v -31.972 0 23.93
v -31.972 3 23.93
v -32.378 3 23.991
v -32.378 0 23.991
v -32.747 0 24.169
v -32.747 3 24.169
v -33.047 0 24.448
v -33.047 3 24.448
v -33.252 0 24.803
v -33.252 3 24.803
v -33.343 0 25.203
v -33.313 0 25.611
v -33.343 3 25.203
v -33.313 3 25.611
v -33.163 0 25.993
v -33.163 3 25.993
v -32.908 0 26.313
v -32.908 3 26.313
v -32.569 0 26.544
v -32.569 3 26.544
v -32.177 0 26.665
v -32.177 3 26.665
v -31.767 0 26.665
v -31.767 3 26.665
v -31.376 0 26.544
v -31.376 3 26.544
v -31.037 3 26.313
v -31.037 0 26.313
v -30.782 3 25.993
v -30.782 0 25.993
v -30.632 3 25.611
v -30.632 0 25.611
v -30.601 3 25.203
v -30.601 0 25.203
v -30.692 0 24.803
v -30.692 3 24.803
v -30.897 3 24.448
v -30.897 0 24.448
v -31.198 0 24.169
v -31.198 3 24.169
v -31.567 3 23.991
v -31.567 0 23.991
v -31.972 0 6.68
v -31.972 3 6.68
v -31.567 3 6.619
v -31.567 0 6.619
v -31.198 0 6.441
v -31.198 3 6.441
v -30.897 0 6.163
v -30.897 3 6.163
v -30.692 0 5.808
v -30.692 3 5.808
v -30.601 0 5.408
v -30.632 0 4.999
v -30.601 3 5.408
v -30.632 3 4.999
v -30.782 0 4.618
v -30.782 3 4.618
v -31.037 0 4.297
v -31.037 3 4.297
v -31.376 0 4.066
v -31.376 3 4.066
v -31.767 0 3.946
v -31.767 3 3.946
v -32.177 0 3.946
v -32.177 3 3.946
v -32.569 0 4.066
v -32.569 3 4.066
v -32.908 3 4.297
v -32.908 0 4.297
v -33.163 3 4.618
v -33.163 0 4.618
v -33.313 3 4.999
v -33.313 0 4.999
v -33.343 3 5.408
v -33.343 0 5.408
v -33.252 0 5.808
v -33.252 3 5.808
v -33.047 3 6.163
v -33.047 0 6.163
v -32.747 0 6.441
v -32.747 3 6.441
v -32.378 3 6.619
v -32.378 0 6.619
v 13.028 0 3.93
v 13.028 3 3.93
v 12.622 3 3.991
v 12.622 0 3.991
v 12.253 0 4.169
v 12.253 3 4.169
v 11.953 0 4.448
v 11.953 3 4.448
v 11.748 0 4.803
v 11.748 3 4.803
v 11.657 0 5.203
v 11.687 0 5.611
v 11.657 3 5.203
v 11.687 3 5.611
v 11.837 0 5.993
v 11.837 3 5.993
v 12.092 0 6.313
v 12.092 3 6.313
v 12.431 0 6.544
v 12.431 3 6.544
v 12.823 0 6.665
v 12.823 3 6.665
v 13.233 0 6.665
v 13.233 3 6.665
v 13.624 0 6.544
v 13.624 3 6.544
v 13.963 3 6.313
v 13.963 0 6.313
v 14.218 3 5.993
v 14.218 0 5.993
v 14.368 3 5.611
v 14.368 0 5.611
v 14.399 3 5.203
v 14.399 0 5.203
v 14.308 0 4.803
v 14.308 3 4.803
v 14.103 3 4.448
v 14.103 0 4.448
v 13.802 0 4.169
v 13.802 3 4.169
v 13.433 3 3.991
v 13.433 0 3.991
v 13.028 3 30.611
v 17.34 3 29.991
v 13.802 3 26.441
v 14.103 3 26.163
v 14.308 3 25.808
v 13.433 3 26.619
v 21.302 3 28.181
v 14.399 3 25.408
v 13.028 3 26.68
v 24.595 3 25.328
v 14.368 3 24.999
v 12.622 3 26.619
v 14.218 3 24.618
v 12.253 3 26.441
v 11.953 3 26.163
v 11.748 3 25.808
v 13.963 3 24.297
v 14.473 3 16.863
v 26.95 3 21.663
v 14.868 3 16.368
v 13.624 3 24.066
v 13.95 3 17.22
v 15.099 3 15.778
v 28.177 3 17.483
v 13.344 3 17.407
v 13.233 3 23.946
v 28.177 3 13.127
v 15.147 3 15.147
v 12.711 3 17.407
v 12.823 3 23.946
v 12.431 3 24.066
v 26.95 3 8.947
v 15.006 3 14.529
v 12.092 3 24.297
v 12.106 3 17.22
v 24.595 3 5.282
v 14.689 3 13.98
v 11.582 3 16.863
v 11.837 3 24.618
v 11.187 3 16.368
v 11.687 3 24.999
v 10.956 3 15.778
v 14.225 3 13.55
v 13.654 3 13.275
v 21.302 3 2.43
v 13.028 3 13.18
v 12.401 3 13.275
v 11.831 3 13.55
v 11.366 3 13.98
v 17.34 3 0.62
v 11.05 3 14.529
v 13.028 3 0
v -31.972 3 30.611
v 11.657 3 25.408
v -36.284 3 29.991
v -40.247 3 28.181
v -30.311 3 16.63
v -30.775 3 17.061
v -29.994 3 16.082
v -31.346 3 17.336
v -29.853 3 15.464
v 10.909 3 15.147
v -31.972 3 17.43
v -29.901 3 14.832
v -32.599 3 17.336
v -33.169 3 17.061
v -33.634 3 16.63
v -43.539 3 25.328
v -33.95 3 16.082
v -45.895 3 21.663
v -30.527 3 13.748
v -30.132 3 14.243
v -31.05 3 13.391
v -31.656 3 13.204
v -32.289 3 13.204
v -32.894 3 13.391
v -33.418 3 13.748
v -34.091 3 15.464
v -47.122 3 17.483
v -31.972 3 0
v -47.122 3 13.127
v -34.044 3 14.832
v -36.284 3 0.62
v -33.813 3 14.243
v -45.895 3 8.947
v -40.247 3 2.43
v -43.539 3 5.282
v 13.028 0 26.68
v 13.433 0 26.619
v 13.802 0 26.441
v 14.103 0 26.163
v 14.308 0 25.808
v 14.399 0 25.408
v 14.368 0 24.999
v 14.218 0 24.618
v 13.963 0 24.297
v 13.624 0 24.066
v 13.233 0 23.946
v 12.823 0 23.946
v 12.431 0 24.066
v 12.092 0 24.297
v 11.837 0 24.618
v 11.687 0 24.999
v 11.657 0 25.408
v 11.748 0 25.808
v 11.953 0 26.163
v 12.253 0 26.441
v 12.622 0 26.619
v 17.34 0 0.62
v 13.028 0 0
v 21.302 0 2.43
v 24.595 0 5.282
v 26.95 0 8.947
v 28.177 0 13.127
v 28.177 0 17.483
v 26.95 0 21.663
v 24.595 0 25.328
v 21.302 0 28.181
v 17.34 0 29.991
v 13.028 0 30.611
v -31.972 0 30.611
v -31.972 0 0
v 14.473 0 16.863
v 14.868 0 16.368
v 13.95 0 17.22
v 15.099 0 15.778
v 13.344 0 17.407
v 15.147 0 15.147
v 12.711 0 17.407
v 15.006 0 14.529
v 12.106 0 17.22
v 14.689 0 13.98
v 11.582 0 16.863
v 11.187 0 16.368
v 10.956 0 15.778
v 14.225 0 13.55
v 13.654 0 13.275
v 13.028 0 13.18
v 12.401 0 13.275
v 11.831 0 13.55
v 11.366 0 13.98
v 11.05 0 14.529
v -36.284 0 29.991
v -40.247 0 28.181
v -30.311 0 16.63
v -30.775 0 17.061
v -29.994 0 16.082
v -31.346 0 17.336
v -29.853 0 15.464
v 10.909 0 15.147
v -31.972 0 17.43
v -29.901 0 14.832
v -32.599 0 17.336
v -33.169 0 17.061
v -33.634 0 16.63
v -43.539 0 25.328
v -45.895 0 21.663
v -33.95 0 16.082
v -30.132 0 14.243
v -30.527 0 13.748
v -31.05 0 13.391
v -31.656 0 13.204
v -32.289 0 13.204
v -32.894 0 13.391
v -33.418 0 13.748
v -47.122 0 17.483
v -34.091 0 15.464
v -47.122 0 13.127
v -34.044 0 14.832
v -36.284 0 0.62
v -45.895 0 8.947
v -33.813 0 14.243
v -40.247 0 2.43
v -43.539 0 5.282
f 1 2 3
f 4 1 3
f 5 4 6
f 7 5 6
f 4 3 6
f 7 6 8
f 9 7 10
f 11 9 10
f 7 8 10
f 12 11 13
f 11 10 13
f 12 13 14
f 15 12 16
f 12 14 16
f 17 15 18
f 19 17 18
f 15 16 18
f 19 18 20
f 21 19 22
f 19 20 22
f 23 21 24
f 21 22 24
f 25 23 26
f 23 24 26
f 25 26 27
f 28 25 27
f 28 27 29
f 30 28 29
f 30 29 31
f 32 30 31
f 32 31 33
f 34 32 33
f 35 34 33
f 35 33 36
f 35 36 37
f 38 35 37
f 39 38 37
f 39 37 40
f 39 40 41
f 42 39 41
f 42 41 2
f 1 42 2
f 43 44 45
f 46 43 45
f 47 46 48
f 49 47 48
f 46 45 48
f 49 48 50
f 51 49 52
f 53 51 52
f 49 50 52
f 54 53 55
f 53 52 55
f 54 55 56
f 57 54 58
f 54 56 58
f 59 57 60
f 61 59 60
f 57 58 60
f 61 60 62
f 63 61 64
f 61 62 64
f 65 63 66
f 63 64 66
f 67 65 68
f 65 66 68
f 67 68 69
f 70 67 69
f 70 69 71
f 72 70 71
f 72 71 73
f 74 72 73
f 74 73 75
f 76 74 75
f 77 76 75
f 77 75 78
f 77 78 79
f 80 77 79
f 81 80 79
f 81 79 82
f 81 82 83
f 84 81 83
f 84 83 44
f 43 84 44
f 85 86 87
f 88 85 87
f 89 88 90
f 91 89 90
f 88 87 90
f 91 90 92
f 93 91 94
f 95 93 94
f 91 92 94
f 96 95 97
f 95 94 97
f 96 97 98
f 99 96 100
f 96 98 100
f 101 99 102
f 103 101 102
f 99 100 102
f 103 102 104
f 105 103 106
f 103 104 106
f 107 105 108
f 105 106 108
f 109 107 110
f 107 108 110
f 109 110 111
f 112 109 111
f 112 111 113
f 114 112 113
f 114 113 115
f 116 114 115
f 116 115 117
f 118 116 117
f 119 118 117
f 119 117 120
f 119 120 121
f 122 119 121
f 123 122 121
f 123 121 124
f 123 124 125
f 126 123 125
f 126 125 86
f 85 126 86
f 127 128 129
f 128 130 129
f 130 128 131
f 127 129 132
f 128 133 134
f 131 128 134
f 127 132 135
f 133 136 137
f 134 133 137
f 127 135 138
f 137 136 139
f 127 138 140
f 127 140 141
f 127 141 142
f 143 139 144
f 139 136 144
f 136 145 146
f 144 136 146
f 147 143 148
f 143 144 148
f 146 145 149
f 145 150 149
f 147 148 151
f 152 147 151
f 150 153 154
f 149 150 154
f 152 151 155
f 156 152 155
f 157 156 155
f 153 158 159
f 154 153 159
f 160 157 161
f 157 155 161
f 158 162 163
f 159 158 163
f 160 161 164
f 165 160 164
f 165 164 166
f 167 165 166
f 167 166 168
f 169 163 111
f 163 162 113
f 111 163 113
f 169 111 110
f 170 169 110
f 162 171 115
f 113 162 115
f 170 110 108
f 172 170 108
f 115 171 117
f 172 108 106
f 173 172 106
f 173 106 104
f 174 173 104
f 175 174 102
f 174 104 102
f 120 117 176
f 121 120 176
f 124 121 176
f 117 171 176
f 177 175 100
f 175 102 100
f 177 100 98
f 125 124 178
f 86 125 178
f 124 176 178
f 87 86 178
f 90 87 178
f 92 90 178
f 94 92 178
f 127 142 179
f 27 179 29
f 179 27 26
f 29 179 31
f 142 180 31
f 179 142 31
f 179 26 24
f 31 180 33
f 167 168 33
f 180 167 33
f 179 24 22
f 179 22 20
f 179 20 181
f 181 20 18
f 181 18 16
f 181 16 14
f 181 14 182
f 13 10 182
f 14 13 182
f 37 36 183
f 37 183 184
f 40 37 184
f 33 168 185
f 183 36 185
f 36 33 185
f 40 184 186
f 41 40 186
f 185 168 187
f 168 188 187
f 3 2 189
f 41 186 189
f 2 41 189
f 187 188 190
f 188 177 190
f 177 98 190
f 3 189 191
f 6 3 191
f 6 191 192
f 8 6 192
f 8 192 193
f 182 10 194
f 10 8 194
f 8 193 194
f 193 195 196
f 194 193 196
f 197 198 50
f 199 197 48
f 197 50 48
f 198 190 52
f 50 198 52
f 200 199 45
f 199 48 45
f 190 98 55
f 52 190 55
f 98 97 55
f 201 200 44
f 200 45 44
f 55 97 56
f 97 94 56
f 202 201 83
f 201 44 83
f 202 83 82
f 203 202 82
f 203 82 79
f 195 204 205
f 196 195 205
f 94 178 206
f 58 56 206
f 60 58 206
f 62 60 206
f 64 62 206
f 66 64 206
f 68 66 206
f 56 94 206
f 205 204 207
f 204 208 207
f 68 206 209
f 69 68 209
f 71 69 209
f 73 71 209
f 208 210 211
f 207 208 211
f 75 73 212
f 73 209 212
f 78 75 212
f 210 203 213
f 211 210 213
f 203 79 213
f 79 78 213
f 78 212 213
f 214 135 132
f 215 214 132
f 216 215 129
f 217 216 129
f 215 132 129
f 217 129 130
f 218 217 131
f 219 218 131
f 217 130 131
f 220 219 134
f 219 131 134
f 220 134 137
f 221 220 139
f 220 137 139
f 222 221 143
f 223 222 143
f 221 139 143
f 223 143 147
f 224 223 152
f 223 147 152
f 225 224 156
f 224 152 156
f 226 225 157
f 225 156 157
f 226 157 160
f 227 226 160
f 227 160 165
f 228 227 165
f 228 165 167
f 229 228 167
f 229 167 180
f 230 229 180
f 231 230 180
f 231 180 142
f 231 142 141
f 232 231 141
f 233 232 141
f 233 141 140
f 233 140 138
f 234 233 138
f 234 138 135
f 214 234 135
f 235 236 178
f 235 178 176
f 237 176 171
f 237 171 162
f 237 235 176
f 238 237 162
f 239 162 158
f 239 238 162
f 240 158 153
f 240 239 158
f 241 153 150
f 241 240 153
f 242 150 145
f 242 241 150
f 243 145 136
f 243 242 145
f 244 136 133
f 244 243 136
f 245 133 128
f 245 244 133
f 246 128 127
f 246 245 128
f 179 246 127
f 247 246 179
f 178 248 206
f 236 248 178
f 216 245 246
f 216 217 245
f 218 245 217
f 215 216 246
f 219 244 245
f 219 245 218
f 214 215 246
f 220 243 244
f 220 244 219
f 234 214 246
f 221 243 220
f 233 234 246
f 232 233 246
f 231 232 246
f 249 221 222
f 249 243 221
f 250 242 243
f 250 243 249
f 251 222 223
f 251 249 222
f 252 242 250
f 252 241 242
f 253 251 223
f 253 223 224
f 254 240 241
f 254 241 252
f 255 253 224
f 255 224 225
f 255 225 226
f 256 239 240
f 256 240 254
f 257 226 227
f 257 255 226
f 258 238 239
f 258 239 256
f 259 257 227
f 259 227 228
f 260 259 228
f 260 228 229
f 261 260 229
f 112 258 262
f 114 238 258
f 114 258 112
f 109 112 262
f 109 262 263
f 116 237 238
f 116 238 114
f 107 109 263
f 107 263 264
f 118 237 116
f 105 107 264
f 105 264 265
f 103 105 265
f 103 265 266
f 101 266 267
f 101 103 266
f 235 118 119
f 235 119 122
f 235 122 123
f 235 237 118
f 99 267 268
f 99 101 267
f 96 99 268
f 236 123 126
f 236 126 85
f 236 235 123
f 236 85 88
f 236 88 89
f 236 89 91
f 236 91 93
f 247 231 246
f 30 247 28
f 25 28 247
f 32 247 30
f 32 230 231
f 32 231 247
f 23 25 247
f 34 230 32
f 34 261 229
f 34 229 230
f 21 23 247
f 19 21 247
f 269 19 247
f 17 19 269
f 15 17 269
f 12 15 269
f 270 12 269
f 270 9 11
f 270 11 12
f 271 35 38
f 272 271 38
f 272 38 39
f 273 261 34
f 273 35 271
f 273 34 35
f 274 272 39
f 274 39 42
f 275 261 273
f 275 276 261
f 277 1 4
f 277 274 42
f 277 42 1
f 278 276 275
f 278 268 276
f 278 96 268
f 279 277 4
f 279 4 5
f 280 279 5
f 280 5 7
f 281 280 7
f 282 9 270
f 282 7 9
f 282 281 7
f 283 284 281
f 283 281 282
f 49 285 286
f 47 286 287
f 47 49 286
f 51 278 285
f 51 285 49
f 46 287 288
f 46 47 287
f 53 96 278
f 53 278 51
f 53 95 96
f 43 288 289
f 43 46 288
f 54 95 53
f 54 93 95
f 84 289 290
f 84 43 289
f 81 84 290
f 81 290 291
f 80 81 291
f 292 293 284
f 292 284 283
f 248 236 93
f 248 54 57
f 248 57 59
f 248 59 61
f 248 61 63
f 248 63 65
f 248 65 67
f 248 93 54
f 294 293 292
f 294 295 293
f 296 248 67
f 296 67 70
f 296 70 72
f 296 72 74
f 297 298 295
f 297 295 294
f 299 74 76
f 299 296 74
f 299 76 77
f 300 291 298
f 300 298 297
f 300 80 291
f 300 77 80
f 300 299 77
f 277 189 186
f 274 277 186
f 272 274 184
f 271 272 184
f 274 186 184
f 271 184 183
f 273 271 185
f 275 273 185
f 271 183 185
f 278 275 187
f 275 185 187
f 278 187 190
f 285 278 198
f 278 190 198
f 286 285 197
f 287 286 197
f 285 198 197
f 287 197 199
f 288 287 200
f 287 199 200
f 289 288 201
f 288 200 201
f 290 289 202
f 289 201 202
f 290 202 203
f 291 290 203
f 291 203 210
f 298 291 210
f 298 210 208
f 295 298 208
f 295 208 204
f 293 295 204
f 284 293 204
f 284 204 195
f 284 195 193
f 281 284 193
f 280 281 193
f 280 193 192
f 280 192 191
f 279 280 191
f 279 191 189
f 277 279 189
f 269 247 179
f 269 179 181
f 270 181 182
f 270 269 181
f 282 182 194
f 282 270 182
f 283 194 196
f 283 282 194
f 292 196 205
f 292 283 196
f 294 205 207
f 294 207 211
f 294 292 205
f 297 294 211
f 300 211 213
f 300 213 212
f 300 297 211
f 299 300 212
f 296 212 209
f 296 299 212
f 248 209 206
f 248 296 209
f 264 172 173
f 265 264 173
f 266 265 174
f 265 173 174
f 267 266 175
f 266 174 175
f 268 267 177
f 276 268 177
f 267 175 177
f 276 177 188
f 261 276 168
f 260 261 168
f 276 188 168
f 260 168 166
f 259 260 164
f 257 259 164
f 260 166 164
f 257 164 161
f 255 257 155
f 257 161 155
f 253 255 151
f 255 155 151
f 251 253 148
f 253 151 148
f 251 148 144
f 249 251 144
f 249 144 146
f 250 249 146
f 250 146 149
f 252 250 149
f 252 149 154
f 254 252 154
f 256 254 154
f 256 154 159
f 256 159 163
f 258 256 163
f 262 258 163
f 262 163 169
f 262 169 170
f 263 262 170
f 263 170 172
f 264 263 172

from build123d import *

# Parameters (mm, degrees)
BOSS_EXTRUDE1_DEPTH = 3
SKETCH2_R           = 2.125
SKETCH2_R_2         = 1.375
CUT_EXTRUDE1_DEPTH  = 57.401986652


with BuildPart() as part:
    # Sketch1 → Boss-Extrude1 (new body)
    with BuildSketch(Plane(origin=(0, 0, 0), x_dir=(1, 0, 0), z_dir=(0, 1, 0))):
        with BuildLine():
            Line((-31.972318339, 0), (13.027681661, 0))
            ThreePointArc((13.027681661, 0), (28.332991201, -15.30530954), (13.027681661, -30.61061908))
            Line((13.027681661, -30.61061908), (-31.972318339, -30.61061908))
            ThreePointArc((-31.972318339, -30.61061908), (-47.277627879, -15.30530954), (-31.972318339, 0))
        make_face()
    extrude(amount=BOSS_EXTRUDE1_DEPTH)

    # Sketch2 → Cut-Extrude1 (cut, through all)
    with BuildSketch(Plane(origin=(0, 3, 0), x_dir=(1, 0, 0), z_dir=(0, 1, 0))):
        with Locations(Location((-31.972318339, -15.30530954, 0), (0, 0, 270))):
            Circle(SKETCH2_R)
        with Locations(Location((-31.972318339, -5.30530954, 0), (0, 0, 270))):
            Circle(SKETCH2_R_2)
        with Locations(Location((-31.972318339, -25.30530954, 0), (0, 0, 90))):
            Circle(SKETCH2_R_2)
        with Locations(Location((13.027681661, -5.30530954, 0), (0, 0, 90))):
            Circle(SKETCH2_R_2)
        with Locations(Location((13.027681661, -15.30530954, 0), (0, 0, 90))):
            Circle(SKETCH2_R)
        with Locations(Location((13.027681661, -25.30530954, 0), (0, 0, 270))):
            Circle(SKETCH2_R_2)
    extrude(amount=-CUT_EXTRUDE1_DEPTH, mode=Mode.SUBTRACT)


solid = part.part
